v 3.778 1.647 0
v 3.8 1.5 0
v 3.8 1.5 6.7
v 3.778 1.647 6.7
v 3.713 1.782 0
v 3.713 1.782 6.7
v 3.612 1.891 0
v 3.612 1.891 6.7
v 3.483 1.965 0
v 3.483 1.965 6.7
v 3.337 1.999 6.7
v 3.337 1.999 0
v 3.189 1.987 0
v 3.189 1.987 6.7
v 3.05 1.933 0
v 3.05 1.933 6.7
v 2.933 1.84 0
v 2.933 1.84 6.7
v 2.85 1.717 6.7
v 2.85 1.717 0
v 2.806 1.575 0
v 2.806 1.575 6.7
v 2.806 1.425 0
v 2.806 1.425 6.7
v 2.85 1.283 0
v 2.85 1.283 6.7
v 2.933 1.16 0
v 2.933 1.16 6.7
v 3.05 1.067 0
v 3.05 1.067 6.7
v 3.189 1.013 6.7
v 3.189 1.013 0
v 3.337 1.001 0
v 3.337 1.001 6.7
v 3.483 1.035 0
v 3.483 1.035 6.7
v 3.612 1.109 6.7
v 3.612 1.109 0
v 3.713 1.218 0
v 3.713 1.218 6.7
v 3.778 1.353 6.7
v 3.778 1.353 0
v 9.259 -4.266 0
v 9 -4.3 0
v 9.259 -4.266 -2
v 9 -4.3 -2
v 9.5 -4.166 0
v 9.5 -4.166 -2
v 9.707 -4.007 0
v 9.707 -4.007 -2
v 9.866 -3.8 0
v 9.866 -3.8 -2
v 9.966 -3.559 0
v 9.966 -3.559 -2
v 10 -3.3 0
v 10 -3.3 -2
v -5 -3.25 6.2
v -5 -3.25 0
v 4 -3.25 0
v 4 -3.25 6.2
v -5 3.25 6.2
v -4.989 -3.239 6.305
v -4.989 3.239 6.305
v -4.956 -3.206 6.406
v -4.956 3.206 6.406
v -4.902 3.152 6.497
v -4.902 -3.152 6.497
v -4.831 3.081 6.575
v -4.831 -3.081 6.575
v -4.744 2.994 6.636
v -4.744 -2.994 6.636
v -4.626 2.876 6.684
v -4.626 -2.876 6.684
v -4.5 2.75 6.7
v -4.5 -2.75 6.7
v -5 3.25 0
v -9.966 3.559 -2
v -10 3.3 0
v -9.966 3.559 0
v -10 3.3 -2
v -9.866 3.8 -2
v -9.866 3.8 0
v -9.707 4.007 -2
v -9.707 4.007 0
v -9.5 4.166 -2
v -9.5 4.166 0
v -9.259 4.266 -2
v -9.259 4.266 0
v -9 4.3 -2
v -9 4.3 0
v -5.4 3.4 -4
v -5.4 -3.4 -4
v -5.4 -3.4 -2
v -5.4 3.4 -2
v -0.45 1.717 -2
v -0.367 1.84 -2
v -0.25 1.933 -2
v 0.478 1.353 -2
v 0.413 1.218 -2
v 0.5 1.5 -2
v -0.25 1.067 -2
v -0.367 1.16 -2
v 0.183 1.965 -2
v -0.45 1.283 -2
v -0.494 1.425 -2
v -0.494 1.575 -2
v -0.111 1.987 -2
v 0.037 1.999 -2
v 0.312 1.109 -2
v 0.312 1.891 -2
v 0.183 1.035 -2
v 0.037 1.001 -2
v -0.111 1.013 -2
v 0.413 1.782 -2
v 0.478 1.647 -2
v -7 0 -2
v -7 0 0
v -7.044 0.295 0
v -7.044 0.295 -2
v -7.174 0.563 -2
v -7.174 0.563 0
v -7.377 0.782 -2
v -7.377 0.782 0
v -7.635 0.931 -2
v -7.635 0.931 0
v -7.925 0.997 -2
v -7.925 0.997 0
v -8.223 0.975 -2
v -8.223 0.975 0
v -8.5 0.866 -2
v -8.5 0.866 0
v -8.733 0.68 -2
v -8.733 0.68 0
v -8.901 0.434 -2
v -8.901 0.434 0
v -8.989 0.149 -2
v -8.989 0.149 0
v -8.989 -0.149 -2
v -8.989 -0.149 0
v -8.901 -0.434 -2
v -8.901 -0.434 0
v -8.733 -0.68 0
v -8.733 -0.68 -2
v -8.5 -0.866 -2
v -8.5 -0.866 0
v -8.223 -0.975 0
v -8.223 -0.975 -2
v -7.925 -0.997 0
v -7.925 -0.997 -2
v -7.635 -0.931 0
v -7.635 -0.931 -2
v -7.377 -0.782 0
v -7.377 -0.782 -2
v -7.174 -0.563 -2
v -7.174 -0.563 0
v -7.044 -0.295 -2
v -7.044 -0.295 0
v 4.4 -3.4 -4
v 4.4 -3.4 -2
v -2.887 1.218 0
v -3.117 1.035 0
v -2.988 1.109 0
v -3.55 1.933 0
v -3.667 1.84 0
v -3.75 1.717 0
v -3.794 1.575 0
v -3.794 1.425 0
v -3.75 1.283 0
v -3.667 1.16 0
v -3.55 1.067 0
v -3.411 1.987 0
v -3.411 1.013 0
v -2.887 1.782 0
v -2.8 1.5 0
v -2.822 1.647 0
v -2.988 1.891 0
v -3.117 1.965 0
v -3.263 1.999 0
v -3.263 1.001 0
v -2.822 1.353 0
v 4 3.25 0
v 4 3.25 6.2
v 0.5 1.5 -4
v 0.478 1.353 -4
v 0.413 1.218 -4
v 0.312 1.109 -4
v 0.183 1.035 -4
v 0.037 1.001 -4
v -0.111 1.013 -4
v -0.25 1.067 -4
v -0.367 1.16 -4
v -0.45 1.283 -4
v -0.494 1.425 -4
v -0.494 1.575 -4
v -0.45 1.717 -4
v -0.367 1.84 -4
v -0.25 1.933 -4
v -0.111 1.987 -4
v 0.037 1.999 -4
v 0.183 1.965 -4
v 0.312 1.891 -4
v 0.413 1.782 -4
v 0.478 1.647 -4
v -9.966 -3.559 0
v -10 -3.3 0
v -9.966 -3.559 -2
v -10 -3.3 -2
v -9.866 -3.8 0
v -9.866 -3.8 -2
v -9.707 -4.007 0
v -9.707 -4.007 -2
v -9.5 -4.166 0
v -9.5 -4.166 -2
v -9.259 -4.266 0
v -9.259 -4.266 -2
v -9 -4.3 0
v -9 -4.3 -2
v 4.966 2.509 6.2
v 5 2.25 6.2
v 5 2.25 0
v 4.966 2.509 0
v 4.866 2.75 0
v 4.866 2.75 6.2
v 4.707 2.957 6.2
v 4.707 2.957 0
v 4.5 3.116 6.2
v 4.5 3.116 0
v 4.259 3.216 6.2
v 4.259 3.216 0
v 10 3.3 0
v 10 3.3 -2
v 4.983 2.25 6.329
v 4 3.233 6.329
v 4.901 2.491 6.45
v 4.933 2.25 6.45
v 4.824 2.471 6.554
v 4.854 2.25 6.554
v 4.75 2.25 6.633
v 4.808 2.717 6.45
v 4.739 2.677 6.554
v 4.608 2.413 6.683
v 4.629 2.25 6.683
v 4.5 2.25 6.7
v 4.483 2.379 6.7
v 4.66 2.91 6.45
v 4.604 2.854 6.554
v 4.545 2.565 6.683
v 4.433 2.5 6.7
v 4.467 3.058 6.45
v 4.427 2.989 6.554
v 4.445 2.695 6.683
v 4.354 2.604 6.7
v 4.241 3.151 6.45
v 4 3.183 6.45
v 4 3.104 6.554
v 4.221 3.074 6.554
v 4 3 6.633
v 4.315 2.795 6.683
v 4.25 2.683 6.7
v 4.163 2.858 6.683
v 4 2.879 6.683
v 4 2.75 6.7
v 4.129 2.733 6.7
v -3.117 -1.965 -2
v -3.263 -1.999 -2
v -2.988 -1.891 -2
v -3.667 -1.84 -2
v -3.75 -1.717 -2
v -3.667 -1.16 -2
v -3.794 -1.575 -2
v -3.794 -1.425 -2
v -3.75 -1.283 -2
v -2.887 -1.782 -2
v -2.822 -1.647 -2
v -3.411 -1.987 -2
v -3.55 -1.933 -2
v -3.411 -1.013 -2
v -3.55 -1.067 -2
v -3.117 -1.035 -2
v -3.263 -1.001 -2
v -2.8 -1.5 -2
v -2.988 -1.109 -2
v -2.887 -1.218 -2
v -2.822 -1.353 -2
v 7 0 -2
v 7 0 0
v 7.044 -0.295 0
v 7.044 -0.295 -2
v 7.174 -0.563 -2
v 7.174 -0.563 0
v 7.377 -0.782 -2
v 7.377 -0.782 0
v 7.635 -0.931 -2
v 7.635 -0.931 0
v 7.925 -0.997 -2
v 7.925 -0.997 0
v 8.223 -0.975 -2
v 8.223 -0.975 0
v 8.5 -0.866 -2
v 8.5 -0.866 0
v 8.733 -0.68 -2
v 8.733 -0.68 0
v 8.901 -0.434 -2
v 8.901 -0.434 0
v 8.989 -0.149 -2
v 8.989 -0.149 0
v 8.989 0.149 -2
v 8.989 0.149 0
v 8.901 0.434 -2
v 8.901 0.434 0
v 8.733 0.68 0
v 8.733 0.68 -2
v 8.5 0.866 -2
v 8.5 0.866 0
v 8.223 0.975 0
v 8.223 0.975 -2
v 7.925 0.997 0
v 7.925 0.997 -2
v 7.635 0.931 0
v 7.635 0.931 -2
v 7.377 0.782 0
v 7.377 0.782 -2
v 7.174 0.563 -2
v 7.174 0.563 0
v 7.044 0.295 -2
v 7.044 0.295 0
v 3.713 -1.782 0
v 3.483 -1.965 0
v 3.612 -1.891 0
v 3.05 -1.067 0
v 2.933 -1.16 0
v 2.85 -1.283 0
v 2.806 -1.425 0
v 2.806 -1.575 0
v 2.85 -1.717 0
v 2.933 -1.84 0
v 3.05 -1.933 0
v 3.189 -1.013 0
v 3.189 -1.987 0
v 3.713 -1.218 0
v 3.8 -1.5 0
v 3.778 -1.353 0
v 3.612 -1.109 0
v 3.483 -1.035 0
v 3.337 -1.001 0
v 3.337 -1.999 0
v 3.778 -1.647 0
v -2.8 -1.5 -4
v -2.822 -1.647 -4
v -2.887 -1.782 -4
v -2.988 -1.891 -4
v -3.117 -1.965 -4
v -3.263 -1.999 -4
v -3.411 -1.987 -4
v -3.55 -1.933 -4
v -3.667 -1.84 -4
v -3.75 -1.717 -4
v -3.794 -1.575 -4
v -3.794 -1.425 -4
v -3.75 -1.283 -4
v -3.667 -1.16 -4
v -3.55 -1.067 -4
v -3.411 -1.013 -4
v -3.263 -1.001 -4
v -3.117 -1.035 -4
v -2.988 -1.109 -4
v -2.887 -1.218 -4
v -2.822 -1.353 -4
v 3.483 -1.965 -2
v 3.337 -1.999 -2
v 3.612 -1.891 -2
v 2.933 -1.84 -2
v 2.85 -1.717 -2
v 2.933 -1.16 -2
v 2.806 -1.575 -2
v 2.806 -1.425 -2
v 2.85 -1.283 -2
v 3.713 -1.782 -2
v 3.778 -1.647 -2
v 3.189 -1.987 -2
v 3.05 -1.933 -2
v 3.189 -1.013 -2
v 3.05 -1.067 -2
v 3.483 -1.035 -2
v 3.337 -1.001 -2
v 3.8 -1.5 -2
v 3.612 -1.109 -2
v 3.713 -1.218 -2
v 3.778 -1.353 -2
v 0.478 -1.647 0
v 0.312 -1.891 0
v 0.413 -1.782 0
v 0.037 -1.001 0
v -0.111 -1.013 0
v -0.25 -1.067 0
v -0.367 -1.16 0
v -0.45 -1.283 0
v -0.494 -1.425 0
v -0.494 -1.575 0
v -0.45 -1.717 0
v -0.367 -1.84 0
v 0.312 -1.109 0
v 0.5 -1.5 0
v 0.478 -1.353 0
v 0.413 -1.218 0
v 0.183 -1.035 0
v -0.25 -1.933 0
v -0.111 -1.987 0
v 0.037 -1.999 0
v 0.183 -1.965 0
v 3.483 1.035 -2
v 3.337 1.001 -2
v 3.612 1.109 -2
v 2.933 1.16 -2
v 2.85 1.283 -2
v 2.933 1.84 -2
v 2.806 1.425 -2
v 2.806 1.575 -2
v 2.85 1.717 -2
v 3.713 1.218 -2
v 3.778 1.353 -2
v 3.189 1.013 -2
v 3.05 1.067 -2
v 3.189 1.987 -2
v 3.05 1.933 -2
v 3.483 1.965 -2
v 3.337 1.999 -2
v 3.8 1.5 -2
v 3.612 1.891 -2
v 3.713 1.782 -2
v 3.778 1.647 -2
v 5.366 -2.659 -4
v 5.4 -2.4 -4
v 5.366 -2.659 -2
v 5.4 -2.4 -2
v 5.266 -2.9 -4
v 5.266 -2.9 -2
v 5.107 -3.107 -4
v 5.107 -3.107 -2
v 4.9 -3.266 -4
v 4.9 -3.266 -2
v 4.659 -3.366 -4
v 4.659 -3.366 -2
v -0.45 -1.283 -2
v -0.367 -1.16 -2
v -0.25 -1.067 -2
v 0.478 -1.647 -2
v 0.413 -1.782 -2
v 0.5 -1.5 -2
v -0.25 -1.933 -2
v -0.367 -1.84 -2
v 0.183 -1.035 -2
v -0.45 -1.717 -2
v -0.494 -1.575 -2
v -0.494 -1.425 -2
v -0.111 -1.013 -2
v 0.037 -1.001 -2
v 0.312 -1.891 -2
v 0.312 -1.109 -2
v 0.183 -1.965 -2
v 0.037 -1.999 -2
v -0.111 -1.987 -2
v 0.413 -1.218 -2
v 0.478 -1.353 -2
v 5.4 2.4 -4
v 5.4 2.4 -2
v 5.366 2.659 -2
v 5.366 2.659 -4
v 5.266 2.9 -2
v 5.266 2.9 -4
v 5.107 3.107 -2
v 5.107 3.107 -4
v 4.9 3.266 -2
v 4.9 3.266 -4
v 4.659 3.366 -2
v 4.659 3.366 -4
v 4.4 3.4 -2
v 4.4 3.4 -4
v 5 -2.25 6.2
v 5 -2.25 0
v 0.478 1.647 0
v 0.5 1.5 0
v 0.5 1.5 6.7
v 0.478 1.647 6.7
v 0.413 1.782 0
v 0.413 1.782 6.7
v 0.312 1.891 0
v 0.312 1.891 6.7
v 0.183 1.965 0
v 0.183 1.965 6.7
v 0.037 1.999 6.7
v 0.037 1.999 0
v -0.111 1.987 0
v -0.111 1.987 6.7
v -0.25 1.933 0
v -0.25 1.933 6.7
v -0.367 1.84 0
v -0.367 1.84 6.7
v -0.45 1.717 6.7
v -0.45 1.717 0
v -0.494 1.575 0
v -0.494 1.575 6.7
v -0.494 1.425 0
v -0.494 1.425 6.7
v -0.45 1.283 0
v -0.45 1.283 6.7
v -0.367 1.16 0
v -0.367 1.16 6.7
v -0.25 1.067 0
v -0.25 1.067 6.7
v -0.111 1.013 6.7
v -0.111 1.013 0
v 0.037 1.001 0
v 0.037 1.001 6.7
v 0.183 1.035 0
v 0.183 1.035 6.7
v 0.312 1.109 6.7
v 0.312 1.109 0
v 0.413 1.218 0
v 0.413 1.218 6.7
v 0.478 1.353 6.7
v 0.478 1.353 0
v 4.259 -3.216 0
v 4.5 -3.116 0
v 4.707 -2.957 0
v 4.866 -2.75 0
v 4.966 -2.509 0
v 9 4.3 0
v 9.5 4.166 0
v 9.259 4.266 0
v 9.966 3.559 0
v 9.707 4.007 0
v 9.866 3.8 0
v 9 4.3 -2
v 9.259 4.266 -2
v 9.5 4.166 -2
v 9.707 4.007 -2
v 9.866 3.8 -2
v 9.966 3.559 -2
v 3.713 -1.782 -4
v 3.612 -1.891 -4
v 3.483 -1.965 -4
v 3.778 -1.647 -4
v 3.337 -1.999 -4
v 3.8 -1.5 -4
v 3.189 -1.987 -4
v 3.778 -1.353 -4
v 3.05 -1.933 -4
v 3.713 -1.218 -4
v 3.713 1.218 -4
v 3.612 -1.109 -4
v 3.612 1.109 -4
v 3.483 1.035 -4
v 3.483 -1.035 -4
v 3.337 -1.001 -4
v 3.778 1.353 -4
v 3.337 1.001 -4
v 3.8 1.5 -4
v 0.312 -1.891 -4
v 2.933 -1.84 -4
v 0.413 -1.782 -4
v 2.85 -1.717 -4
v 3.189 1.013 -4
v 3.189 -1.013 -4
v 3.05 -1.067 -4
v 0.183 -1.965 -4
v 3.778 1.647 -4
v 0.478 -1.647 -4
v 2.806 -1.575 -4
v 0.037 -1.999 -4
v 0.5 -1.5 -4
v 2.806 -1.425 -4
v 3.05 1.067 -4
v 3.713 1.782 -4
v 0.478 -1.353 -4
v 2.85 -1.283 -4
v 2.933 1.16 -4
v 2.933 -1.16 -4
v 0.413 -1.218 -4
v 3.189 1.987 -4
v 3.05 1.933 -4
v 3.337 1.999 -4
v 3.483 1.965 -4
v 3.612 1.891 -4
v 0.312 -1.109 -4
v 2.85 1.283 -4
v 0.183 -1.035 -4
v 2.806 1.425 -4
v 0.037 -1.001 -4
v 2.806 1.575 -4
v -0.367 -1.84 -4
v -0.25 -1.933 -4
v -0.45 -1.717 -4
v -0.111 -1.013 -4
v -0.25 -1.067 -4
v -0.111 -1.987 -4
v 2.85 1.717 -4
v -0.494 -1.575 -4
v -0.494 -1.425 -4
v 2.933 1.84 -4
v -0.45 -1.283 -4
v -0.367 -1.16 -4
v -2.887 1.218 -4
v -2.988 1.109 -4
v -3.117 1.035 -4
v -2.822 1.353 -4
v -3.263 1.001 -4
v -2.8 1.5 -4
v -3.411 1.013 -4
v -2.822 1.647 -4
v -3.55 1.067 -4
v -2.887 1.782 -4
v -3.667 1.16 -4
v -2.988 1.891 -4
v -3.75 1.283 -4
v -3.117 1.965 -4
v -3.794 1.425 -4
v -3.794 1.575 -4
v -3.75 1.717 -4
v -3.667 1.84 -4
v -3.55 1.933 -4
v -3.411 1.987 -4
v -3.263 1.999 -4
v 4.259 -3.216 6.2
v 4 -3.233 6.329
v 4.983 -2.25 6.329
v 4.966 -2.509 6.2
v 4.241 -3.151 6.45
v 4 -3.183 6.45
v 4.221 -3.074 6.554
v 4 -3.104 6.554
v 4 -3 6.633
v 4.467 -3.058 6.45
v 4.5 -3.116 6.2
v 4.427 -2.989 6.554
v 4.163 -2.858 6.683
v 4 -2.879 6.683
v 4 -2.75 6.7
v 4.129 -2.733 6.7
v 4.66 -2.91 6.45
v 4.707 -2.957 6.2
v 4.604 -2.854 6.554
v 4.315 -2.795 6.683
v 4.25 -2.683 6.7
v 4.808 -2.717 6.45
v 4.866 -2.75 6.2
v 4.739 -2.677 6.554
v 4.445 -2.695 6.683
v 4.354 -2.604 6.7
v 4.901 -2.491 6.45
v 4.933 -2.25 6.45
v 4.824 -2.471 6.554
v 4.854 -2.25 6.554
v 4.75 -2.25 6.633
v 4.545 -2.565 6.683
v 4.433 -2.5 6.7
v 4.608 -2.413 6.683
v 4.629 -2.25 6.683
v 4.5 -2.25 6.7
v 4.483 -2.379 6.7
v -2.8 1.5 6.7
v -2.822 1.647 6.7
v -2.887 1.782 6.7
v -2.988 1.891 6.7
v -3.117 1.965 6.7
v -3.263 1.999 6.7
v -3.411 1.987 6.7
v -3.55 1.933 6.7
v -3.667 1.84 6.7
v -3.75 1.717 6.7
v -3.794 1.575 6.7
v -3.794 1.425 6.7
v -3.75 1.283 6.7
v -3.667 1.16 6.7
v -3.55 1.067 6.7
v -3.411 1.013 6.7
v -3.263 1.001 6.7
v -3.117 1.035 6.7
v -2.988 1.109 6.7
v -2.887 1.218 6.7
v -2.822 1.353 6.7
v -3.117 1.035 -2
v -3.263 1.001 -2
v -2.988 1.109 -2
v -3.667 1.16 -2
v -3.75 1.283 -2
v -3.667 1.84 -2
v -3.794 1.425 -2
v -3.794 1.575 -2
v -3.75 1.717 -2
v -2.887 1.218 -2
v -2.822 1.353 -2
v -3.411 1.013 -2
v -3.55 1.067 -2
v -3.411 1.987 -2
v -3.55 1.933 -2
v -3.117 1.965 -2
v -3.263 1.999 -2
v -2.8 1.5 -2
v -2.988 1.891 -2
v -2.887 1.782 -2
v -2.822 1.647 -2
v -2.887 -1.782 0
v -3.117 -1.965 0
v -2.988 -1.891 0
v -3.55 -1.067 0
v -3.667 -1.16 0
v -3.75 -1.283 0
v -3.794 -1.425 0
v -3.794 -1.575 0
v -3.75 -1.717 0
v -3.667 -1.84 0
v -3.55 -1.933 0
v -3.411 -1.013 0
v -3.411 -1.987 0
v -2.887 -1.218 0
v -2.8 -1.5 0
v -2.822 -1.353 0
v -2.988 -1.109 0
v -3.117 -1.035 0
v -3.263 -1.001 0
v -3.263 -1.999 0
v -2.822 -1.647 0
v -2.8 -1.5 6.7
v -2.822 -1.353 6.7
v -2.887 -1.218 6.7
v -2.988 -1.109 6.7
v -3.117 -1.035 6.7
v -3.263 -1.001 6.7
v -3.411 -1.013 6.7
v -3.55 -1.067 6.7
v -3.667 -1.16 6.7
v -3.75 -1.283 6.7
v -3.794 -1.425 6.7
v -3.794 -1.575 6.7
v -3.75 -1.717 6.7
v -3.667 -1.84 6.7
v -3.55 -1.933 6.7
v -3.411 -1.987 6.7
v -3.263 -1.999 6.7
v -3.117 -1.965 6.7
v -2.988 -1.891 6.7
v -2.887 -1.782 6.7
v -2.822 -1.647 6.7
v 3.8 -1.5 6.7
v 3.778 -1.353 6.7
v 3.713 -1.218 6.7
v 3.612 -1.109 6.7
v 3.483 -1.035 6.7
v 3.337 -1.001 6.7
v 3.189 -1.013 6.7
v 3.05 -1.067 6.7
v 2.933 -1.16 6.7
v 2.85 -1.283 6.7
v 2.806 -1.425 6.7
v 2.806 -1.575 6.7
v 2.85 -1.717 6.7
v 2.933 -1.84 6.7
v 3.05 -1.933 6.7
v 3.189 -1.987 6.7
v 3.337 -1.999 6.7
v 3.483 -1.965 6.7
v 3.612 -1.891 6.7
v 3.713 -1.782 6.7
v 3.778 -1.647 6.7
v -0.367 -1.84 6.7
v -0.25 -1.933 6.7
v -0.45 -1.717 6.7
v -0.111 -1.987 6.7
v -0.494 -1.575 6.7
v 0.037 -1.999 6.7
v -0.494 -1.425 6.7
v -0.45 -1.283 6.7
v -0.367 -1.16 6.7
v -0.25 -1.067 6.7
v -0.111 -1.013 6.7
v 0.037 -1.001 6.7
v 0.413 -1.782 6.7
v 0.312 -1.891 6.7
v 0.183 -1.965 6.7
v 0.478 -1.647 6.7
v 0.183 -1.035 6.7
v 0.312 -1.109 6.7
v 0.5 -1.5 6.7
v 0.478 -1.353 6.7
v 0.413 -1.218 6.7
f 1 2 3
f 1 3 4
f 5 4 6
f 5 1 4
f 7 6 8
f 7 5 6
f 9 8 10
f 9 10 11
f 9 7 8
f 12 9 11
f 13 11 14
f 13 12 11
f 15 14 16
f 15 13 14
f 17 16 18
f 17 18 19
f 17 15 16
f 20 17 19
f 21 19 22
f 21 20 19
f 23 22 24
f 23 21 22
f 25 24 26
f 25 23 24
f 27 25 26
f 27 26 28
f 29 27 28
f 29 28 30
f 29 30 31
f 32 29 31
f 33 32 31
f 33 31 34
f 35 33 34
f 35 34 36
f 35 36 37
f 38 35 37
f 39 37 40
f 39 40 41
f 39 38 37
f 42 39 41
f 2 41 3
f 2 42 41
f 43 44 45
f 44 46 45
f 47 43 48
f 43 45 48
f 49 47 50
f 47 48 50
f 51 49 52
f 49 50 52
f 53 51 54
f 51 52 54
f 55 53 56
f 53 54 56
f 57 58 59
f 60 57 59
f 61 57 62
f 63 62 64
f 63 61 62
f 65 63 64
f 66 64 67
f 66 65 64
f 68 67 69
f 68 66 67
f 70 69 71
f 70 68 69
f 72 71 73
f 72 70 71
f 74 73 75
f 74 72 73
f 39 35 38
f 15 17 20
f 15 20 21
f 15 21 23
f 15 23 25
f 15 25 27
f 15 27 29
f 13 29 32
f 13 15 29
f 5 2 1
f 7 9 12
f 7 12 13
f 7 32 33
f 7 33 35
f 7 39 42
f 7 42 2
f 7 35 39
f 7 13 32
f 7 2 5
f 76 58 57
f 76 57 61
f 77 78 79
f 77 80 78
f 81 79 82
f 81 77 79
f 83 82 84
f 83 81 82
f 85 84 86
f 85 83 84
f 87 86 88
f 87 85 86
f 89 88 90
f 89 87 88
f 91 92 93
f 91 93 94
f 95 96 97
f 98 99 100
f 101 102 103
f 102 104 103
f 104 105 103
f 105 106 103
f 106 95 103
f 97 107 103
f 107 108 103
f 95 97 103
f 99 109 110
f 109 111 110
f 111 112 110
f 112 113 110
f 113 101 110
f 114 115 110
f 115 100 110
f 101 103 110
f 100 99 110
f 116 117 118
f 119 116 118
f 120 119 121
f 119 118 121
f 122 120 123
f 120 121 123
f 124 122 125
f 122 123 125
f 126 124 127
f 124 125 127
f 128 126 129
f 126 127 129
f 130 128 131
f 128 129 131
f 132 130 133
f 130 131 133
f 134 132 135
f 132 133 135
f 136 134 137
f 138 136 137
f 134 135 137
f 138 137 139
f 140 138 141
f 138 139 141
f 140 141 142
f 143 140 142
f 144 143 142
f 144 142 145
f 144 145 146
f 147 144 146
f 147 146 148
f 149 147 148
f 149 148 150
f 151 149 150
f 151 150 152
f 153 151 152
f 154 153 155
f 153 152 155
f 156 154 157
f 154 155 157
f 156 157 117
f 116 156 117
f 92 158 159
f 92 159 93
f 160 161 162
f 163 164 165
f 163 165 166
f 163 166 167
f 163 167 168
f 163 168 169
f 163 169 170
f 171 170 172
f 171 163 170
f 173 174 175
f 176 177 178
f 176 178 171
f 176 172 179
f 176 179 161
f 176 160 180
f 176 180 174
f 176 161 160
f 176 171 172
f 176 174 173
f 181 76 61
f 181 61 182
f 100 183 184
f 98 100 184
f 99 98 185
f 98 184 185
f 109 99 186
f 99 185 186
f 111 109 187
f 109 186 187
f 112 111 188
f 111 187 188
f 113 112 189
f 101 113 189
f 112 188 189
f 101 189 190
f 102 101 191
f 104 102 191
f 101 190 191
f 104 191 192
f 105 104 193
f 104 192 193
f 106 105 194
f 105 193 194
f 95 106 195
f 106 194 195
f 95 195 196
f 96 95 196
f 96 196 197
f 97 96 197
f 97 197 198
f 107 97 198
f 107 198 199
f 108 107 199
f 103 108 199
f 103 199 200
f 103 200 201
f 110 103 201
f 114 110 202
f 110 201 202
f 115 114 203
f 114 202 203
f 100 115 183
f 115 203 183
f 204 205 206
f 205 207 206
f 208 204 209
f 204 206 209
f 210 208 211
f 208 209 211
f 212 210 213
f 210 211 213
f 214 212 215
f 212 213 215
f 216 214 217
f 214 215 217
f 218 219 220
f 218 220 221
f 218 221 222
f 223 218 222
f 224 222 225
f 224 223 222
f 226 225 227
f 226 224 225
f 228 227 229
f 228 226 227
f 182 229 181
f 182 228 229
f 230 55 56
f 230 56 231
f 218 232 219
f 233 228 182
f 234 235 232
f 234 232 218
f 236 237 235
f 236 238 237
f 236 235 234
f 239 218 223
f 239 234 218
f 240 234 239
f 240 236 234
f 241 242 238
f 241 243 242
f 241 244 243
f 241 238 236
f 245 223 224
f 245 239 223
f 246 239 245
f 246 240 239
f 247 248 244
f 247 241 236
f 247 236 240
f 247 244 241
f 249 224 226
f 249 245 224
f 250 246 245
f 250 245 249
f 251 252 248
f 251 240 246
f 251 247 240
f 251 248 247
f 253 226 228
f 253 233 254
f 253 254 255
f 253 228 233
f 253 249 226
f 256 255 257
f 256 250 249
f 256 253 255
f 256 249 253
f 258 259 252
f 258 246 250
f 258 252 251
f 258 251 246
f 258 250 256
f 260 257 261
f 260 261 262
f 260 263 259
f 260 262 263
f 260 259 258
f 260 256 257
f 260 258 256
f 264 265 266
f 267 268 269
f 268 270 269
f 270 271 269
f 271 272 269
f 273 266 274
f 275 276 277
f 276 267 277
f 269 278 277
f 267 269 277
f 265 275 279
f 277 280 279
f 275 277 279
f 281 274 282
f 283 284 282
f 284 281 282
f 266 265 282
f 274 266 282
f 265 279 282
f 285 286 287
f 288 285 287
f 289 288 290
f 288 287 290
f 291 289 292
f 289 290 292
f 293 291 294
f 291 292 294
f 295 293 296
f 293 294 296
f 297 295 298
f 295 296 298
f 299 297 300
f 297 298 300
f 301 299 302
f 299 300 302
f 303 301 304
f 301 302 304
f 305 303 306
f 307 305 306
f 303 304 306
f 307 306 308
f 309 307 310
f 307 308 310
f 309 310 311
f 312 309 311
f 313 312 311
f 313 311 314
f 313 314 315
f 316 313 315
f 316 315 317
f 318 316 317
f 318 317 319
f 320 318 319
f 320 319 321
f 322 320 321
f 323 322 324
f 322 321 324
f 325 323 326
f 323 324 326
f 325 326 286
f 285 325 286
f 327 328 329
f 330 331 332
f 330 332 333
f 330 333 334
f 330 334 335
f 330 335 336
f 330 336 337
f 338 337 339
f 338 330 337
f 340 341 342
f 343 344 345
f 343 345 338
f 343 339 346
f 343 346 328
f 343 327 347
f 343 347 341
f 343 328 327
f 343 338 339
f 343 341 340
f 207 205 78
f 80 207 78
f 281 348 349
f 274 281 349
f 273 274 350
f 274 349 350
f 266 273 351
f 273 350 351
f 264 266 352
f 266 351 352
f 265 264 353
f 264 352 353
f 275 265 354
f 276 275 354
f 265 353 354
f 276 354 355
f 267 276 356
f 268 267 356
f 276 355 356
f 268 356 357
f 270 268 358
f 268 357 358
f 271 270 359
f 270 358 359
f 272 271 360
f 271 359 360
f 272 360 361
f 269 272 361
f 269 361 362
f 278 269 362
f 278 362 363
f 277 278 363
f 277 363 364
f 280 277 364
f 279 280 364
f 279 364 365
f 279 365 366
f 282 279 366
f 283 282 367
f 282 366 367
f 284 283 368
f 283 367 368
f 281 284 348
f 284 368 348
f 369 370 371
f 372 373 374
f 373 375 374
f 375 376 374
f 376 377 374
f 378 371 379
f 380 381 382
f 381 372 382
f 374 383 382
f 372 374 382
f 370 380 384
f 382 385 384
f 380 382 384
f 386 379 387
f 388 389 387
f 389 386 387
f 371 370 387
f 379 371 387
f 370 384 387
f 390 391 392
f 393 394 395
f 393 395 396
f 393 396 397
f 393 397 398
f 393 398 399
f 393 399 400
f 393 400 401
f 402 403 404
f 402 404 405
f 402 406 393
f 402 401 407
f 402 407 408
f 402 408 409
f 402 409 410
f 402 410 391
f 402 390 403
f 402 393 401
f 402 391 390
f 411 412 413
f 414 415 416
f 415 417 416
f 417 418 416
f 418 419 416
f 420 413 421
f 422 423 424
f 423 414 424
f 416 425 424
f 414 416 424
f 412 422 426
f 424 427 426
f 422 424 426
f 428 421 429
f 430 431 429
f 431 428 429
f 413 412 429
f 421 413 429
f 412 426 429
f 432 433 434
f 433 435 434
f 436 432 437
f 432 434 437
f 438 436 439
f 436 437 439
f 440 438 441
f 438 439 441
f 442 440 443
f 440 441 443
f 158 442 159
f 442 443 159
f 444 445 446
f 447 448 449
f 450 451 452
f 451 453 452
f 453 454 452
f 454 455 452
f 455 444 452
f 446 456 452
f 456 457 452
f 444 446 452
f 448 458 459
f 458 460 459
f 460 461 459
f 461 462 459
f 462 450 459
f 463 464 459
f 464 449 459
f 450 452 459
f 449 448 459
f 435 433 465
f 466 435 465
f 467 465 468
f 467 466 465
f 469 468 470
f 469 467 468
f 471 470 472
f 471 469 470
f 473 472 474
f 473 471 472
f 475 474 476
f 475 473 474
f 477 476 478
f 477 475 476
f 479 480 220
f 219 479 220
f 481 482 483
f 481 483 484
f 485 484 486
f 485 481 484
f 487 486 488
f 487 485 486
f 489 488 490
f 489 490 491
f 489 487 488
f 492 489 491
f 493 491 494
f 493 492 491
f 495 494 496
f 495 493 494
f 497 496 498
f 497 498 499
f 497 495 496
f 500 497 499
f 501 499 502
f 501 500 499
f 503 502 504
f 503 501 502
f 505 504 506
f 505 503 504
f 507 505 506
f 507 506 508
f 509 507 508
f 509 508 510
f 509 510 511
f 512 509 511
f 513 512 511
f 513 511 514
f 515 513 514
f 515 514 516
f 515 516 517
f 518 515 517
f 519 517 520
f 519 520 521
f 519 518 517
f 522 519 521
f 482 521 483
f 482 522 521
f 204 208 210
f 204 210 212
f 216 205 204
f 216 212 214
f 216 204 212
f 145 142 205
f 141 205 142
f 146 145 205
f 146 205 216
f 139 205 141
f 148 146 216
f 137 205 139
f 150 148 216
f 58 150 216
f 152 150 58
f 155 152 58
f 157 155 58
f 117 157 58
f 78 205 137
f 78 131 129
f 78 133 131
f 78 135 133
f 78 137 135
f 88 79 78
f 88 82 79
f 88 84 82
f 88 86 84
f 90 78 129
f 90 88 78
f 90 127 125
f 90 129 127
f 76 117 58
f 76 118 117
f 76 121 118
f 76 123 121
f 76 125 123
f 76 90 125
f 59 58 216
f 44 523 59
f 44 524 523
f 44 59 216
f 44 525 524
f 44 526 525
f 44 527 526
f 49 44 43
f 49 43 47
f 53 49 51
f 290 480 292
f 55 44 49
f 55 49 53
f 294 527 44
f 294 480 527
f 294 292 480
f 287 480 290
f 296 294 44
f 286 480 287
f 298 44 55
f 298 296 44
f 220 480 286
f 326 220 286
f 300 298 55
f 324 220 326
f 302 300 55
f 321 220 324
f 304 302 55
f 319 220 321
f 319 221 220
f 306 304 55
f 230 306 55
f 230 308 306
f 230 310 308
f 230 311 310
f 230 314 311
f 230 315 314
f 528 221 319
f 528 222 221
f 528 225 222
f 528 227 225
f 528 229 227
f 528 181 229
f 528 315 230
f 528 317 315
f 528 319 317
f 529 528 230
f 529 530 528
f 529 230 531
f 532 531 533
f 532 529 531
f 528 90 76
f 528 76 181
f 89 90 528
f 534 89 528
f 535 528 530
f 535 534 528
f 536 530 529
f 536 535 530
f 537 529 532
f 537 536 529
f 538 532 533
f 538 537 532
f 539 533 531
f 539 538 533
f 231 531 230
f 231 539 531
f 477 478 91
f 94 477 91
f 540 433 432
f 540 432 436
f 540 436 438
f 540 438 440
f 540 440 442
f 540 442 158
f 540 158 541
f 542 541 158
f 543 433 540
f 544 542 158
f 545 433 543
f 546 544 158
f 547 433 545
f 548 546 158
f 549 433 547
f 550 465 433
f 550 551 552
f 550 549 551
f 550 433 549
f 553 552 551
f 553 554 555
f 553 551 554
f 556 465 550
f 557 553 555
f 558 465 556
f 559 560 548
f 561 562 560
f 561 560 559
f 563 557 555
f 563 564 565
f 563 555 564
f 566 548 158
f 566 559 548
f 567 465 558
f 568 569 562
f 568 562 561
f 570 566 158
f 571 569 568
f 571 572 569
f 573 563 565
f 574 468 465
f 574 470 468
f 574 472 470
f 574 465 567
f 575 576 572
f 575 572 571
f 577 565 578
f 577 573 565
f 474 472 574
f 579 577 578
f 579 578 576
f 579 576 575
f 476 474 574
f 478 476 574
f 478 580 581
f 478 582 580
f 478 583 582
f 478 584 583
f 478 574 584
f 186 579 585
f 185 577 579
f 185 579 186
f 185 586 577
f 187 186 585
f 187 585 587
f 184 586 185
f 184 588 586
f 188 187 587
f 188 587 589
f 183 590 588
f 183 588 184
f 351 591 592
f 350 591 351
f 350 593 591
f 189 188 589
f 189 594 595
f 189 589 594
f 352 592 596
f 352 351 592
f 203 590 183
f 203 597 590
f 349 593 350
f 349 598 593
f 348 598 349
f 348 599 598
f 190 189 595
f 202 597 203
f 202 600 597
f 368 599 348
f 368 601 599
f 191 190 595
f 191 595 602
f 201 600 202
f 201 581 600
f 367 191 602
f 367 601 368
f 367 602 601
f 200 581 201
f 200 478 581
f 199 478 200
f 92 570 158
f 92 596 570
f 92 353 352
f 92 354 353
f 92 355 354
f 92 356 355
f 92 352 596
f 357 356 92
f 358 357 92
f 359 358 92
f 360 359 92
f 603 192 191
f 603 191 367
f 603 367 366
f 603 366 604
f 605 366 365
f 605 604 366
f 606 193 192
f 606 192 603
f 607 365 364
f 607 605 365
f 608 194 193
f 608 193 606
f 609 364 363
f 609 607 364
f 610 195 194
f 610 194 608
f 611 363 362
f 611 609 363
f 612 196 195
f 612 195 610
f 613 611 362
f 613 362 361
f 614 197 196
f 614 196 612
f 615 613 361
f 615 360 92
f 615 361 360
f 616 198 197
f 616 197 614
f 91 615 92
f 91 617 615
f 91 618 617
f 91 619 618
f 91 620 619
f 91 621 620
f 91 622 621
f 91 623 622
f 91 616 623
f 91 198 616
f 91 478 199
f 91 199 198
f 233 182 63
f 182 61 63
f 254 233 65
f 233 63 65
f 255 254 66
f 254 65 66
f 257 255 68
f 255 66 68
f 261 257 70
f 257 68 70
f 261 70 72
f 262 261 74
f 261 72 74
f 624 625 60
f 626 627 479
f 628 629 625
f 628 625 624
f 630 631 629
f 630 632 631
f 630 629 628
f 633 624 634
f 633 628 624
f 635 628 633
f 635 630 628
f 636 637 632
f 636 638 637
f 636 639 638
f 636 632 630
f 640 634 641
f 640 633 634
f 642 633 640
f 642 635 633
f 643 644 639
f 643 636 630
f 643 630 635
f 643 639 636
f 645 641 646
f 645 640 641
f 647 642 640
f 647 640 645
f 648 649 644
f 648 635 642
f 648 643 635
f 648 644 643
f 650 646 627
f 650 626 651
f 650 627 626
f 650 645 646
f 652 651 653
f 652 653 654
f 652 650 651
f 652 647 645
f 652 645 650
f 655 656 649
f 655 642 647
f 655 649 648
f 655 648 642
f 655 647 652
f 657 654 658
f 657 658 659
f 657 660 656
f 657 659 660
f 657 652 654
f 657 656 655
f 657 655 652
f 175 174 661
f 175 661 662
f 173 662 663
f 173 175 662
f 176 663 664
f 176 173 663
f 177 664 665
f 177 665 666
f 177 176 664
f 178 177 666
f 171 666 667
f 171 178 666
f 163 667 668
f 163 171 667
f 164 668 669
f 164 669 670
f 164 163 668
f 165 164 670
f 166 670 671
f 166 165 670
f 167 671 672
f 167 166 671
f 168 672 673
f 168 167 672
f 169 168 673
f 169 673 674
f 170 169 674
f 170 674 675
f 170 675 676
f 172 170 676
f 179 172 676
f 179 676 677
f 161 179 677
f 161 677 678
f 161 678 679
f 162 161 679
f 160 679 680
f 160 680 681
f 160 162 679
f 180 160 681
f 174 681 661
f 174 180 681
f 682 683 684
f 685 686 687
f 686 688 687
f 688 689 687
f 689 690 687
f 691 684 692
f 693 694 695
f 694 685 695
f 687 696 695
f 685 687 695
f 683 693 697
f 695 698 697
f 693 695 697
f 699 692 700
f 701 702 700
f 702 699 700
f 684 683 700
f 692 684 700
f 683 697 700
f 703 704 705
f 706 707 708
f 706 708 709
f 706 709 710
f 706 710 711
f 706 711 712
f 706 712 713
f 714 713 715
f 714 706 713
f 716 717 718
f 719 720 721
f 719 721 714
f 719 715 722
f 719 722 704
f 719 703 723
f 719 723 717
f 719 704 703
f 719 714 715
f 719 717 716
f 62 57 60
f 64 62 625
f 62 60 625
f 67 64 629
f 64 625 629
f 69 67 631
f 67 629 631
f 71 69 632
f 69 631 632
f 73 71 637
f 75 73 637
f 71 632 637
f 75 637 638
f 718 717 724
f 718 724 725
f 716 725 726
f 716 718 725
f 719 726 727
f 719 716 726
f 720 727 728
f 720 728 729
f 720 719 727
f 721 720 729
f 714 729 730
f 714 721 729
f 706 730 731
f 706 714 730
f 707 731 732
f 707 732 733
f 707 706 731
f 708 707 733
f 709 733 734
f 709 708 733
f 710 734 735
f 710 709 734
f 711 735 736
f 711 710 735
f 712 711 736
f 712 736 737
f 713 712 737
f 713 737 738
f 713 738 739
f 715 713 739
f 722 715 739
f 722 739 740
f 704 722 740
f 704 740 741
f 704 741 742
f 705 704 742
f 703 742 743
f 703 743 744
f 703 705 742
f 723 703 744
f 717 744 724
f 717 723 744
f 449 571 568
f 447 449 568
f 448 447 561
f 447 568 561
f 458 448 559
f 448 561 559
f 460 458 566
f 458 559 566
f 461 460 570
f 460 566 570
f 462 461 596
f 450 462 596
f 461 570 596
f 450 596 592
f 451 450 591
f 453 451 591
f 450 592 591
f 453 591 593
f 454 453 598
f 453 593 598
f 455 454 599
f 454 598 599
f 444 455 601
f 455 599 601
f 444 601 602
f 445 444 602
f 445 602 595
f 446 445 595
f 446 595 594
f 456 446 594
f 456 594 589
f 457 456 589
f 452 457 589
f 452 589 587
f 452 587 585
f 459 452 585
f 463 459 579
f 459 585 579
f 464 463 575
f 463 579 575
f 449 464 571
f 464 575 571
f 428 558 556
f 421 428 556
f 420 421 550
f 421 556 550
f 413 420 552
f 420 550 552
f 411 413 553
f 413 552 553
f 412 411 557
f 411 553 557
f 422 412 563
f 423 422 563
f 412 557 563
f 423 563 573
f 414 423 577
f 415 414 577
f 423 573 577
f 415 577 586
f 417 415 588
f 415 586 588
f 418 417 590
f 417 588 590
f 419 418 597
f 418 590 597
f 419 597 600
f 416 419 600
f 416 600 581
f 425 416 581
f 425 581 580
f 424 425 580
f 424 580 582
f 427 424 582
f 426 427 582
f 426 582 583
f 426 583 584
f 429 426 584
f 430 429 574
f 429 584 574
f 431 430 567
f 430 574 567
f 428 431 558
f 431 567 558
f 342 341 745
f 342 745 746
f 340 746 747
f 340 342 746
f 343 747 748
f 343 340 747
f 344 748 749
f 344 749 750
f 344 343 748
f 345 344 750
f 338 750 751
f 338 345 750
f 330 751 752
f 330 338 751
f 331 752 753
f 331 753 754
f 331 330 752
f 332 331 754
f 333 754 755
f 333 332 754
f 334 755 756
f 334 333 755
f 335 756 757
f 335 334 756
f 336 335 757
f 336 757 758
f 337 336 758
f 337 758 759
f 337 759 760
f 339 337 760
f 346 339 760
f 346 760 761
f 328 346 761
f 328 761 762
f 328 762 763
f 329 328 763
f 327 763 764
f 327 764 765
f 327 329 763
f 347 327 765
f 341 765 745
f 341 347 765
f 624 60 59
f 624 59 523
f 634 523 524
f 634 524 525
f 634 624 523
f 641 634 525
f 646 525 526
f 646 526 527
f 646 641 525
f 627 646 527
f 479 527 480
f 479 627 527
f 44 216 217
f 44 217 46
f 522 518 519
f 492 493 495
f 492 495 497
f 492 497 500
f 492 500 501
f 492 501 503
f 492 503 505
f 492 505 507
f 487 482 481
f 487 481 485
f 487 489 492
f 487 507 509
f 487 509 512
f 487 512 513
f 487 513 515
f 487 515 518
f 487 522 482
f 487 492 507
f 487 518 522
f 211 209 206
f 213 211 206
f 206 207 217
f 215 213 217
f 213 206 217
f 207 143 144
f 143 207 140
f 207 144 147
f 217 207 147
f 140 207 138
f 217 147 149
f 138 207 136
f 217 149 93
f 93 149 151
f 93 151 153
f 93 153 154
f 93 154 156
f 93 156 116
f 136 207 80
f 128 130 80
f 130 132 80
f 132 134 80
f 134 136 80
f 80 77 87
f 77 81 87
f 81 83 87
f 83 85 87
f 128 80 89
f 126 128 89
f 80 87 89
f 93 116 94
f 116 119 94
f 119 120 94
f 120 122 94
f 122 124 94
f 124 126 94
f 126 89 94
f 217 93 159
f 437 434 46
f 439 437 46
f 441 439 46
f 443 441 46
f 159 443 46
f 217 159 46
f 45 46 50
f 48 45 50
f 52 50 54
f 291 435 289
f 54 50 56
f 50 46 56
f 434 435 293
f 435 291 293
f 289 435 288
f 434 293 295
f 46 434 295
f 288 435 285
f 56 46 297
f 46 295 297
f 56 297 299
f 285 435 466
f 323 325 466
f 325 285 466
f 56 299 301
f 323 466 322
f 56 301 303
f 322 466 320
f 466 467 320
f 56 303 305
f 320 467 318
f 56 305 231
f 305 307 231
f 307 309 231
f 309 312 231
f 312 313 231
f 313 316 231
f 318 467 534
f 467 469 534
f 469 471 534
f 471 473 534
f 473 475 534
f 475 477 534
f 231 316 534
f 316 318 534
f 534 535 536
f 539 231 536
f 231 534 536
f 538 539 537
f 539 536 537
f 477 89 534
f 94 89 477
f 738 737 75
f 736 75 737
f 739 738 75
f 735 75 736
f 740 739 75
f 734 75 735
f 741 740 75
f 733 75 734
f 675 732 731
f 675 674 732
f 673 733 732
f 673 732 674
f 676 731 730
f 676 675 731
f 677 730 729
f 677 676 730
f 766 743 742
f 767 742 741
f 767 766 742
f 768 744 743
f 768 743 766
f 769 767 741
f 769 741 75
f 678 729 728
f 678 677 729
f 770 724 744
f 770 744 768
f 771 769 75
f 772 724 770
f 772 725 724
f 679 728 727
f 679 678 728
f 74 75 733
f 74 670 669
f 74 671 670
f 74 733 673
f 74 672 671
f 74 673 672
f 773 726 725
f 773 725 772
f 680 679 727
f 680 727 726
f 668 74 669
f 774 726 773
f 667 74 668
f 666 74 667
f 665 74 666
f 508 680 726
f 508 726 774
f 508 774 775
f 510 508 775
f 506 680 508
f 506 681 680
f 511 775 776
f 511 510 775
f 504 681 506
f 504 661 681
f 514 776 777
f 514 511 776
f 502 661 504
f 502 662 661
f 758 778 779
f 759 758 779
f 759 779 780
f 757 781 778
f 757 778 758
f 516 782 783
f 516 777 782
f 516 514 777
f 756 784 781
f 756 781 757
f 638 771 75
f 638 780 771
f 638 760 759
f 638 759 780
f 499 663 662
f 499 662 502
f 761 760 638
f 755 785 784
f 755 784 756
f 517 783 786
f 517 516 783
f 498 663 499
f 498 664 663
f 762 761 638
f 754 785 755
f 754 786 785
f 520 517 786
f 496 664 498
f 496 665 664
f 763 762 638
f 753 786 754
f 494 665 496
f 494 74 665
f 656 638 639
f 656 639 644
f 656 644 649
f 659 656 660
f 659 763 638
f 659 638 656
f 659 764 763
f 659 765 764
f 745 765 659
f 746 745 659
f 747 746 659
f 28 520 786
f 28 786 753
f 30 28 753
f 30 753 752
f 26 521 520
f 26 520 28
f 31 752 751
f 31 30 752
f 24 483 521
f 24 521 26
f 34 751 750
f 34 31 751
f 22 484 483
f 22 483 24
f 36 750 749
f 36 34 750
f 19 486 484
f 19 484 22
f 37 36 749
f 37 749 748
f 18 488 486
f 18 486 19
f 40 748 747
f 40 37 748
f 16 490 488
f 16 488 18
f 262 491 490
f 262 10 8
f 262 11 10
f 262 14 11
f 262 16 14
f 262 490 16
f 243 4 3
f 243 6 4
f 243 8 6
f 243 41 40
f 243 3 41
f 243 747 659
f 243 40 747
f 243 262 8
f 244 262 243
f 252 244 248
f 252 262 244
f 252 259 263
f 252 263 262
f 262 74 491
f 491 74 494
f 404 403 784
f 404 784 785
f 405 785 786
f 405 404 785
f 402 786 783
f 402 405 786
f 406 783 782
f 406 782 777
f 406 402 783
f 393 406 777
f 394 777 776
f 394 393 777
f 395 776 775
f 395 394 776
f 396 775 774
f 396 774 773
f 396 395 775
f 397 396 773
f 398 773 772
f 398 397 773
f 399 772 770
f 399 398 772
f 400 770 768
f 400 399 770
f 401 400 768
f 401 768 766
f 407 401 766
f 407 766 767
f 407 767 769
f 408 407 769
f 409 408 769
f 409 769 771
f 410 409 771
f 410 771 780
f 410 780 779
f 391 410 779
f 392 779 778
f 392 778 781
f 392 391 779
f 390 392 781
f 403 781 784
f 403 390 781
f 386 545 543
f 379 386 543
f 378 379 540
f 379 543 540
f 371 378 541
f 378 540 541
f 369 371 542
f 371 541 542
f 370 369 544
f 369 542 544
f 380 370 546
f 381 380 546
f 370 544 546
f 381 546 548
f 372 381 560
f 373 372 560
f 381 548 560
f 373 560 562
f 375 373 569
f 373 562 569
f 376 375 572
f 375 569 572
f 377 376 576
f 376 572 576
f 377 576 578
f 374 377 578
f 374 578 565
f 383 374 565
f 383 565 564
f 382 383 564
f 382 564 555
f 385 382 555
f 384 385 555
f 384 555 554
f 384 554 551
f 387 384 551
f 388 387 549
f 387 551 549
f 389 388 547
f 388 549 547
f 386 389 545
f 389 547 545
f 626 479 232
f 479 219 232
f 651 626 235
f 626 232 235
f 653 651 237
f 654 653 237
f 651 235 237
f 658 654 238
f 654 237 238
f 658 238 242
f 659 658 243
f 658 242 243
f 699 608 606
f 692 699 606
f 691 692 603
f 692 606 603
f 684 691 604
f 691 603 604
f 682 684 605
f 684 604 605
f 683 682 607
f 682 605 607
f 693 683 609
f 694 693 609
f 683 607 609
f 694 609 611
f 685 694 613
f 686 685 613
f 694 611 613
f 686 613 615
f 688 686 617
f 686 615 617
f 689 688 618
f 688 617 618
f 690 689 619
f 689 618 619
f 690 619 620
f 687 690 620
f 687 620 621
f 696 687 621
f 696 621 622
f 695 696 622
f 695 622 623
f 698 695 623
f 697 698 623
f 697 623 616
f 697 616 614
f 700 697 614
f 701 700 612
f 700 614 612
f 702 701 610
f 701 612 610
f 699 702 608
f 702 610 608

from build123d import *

# Parameters (mm, degrees)
SKETCH_2_W      = 10
SKETCH_2_H      = 6.5
SKETCH_2_R      = 0.5
EXTRUDE_1_DEPTH = 6.7
SKETCH_4_W      = 20
SKETCH_4_H      = 8.6
SKETCH_4_R      = 1
EXTRUDE_2_DEPTH = 2
EXTRUDE_START   = 2
SKETCH_7_W      = 10.8
SKETCH_7_H      = 6.8
SKETCH_7_R      = 0.5
EXTRUDE_3_DEPTH = 2
FILLET_1_R      = 1
FILLET_2_R      = 1
FILLET_4_R      = 0.5


with BuildPart() as part:
    # 草图2 → 凸台-拉伸1 (new body)
    with BuildSketch(Plane.XY):
        Rectangle(SKETCH_2_W, SKETCH_2_H)
        with Locations((-3.3, 1.5)):
            Circle(SKETCH_2_R, mode=Mode.SUBTRACT)
        with Locations((0, 1.5)):
            Circle(SKETCH_2_R, mode=Mode.SUBTRACT)
        with Locations((3.3, 1.5)):
            Circle(SKETCH_2_R, mode=Mode.SUBTRACT)
        with Locations((0, -1.5)):
            Circle(SKETCH_2_R, mode=Mode.SUBTRACT)
        with Locations((3.3, -1.5)):
            Circle(SKETCH_2_R, mode=Mode.SUBTRACT)
        with Locations((-3.3, -1.5)):
            Circle(SKETCH_2_R, mode=Mode.SUBTRACT)
    extrude(amount=EXTRUDE_1_DEPTH)

    # 草图4 → 凸台-拉伸2 (add)
    with BuildSketch(Plane.XY):
        Rectangle(SKETCH_4_W, SKETCH_4_H)
        with Locations((-8, 0)):
            Circle(SKETCH_4_R, mode=Mode.SUBTRACT)
        with Locations(Location((8, 0, 0), (0, 0, 180))):
            Circle(SKETCH_4_R, mode=Mode.SUBTRACT)
    extrude(amount=-EXTRUDE_2_DEPTH)

    # 草图7 → 凸台-拉伸3 (add)
    with BuildSketch(Plane(origin=(0, 0, -2), x_dir=(-1, 0, 0), z_dir=(0, 0, -1)).offset(EXTRUDE_START)):
        Rectangle(SKETCH_7_W, SKETCH_7_H)
        with Locations(Location((-3.3, 1.5, 0), (0, 0, 180))):
            Circle(SKETCH_7_R, mode=Mode.SUBTRACT)
        with Locations(Location((0, 1.5, 0), (0, 0, 180))):
            Circle(SKETCH_7_R, mode=Mode.SUBTRACT)
        with Locations(Location((3.3, 1.5, 0), (0, 0, 180))):
            Circle(SKETCH_7_R, mode=Mode.SUBTRACT)
        with Locations(Location((0, -1.5, 0), (0, 0, 180))):
            Circle(SKETCH_7_R, mode=Mode.SUBTRACT)
        with Locations(Location((3.3, -1.5, 0), (0, 0, 180))):
            Circle(SKETCH_7_R, mode=Mode.SUBTRACT)
        with Locations(Location((-3.3, -1.5, 0), (0, 0, 180))):
            Circle(SKETCH_7_R, mode=Mode.SUBTRACT)
    extrude(amount=-EXTRUDE_3_DEPTH)

    # 圆角1
    fillet_1_edges = [part.edges().sort_by_distance(p)[0] for p in [
        (10, 4.3, -1),
        (10, -4.3, -1),
        (-10, -4.3, -1),
        (-10, 4.3, -1),
    ]]
    fillet(fillet_1_edges, radius=FILLET_1_R)

    # 圆角2
    fillet_2_edges = [part.edges().sort_by_distance(p)[0] for p in [
        (5, -3.25, 3.35),
        (5, 3.25, 3.35),
        (5.4, 3.4, -3),
        (5.4, -3.4, -3),
    ]]
    fillet(fillet_2_edges, radius=FILLET_2_R)

    # 圆角4
    fillet_4_edges = [part.edges().sort_by_distance(p)[0] for p in [
        (-5, 0, 6.7),
        (5, 0, 6.7),
        (-0.5, 3.25, 6.7),
        (4.707106781, 2.957106781, 6.7),
        (4.707106781, -2.957106781, 6.7),
        (-0.5, -3.25, 6.7),
    ]]
    fillet(fillet_4_edges, radius=FILLET_4_R)


solid = part.part
